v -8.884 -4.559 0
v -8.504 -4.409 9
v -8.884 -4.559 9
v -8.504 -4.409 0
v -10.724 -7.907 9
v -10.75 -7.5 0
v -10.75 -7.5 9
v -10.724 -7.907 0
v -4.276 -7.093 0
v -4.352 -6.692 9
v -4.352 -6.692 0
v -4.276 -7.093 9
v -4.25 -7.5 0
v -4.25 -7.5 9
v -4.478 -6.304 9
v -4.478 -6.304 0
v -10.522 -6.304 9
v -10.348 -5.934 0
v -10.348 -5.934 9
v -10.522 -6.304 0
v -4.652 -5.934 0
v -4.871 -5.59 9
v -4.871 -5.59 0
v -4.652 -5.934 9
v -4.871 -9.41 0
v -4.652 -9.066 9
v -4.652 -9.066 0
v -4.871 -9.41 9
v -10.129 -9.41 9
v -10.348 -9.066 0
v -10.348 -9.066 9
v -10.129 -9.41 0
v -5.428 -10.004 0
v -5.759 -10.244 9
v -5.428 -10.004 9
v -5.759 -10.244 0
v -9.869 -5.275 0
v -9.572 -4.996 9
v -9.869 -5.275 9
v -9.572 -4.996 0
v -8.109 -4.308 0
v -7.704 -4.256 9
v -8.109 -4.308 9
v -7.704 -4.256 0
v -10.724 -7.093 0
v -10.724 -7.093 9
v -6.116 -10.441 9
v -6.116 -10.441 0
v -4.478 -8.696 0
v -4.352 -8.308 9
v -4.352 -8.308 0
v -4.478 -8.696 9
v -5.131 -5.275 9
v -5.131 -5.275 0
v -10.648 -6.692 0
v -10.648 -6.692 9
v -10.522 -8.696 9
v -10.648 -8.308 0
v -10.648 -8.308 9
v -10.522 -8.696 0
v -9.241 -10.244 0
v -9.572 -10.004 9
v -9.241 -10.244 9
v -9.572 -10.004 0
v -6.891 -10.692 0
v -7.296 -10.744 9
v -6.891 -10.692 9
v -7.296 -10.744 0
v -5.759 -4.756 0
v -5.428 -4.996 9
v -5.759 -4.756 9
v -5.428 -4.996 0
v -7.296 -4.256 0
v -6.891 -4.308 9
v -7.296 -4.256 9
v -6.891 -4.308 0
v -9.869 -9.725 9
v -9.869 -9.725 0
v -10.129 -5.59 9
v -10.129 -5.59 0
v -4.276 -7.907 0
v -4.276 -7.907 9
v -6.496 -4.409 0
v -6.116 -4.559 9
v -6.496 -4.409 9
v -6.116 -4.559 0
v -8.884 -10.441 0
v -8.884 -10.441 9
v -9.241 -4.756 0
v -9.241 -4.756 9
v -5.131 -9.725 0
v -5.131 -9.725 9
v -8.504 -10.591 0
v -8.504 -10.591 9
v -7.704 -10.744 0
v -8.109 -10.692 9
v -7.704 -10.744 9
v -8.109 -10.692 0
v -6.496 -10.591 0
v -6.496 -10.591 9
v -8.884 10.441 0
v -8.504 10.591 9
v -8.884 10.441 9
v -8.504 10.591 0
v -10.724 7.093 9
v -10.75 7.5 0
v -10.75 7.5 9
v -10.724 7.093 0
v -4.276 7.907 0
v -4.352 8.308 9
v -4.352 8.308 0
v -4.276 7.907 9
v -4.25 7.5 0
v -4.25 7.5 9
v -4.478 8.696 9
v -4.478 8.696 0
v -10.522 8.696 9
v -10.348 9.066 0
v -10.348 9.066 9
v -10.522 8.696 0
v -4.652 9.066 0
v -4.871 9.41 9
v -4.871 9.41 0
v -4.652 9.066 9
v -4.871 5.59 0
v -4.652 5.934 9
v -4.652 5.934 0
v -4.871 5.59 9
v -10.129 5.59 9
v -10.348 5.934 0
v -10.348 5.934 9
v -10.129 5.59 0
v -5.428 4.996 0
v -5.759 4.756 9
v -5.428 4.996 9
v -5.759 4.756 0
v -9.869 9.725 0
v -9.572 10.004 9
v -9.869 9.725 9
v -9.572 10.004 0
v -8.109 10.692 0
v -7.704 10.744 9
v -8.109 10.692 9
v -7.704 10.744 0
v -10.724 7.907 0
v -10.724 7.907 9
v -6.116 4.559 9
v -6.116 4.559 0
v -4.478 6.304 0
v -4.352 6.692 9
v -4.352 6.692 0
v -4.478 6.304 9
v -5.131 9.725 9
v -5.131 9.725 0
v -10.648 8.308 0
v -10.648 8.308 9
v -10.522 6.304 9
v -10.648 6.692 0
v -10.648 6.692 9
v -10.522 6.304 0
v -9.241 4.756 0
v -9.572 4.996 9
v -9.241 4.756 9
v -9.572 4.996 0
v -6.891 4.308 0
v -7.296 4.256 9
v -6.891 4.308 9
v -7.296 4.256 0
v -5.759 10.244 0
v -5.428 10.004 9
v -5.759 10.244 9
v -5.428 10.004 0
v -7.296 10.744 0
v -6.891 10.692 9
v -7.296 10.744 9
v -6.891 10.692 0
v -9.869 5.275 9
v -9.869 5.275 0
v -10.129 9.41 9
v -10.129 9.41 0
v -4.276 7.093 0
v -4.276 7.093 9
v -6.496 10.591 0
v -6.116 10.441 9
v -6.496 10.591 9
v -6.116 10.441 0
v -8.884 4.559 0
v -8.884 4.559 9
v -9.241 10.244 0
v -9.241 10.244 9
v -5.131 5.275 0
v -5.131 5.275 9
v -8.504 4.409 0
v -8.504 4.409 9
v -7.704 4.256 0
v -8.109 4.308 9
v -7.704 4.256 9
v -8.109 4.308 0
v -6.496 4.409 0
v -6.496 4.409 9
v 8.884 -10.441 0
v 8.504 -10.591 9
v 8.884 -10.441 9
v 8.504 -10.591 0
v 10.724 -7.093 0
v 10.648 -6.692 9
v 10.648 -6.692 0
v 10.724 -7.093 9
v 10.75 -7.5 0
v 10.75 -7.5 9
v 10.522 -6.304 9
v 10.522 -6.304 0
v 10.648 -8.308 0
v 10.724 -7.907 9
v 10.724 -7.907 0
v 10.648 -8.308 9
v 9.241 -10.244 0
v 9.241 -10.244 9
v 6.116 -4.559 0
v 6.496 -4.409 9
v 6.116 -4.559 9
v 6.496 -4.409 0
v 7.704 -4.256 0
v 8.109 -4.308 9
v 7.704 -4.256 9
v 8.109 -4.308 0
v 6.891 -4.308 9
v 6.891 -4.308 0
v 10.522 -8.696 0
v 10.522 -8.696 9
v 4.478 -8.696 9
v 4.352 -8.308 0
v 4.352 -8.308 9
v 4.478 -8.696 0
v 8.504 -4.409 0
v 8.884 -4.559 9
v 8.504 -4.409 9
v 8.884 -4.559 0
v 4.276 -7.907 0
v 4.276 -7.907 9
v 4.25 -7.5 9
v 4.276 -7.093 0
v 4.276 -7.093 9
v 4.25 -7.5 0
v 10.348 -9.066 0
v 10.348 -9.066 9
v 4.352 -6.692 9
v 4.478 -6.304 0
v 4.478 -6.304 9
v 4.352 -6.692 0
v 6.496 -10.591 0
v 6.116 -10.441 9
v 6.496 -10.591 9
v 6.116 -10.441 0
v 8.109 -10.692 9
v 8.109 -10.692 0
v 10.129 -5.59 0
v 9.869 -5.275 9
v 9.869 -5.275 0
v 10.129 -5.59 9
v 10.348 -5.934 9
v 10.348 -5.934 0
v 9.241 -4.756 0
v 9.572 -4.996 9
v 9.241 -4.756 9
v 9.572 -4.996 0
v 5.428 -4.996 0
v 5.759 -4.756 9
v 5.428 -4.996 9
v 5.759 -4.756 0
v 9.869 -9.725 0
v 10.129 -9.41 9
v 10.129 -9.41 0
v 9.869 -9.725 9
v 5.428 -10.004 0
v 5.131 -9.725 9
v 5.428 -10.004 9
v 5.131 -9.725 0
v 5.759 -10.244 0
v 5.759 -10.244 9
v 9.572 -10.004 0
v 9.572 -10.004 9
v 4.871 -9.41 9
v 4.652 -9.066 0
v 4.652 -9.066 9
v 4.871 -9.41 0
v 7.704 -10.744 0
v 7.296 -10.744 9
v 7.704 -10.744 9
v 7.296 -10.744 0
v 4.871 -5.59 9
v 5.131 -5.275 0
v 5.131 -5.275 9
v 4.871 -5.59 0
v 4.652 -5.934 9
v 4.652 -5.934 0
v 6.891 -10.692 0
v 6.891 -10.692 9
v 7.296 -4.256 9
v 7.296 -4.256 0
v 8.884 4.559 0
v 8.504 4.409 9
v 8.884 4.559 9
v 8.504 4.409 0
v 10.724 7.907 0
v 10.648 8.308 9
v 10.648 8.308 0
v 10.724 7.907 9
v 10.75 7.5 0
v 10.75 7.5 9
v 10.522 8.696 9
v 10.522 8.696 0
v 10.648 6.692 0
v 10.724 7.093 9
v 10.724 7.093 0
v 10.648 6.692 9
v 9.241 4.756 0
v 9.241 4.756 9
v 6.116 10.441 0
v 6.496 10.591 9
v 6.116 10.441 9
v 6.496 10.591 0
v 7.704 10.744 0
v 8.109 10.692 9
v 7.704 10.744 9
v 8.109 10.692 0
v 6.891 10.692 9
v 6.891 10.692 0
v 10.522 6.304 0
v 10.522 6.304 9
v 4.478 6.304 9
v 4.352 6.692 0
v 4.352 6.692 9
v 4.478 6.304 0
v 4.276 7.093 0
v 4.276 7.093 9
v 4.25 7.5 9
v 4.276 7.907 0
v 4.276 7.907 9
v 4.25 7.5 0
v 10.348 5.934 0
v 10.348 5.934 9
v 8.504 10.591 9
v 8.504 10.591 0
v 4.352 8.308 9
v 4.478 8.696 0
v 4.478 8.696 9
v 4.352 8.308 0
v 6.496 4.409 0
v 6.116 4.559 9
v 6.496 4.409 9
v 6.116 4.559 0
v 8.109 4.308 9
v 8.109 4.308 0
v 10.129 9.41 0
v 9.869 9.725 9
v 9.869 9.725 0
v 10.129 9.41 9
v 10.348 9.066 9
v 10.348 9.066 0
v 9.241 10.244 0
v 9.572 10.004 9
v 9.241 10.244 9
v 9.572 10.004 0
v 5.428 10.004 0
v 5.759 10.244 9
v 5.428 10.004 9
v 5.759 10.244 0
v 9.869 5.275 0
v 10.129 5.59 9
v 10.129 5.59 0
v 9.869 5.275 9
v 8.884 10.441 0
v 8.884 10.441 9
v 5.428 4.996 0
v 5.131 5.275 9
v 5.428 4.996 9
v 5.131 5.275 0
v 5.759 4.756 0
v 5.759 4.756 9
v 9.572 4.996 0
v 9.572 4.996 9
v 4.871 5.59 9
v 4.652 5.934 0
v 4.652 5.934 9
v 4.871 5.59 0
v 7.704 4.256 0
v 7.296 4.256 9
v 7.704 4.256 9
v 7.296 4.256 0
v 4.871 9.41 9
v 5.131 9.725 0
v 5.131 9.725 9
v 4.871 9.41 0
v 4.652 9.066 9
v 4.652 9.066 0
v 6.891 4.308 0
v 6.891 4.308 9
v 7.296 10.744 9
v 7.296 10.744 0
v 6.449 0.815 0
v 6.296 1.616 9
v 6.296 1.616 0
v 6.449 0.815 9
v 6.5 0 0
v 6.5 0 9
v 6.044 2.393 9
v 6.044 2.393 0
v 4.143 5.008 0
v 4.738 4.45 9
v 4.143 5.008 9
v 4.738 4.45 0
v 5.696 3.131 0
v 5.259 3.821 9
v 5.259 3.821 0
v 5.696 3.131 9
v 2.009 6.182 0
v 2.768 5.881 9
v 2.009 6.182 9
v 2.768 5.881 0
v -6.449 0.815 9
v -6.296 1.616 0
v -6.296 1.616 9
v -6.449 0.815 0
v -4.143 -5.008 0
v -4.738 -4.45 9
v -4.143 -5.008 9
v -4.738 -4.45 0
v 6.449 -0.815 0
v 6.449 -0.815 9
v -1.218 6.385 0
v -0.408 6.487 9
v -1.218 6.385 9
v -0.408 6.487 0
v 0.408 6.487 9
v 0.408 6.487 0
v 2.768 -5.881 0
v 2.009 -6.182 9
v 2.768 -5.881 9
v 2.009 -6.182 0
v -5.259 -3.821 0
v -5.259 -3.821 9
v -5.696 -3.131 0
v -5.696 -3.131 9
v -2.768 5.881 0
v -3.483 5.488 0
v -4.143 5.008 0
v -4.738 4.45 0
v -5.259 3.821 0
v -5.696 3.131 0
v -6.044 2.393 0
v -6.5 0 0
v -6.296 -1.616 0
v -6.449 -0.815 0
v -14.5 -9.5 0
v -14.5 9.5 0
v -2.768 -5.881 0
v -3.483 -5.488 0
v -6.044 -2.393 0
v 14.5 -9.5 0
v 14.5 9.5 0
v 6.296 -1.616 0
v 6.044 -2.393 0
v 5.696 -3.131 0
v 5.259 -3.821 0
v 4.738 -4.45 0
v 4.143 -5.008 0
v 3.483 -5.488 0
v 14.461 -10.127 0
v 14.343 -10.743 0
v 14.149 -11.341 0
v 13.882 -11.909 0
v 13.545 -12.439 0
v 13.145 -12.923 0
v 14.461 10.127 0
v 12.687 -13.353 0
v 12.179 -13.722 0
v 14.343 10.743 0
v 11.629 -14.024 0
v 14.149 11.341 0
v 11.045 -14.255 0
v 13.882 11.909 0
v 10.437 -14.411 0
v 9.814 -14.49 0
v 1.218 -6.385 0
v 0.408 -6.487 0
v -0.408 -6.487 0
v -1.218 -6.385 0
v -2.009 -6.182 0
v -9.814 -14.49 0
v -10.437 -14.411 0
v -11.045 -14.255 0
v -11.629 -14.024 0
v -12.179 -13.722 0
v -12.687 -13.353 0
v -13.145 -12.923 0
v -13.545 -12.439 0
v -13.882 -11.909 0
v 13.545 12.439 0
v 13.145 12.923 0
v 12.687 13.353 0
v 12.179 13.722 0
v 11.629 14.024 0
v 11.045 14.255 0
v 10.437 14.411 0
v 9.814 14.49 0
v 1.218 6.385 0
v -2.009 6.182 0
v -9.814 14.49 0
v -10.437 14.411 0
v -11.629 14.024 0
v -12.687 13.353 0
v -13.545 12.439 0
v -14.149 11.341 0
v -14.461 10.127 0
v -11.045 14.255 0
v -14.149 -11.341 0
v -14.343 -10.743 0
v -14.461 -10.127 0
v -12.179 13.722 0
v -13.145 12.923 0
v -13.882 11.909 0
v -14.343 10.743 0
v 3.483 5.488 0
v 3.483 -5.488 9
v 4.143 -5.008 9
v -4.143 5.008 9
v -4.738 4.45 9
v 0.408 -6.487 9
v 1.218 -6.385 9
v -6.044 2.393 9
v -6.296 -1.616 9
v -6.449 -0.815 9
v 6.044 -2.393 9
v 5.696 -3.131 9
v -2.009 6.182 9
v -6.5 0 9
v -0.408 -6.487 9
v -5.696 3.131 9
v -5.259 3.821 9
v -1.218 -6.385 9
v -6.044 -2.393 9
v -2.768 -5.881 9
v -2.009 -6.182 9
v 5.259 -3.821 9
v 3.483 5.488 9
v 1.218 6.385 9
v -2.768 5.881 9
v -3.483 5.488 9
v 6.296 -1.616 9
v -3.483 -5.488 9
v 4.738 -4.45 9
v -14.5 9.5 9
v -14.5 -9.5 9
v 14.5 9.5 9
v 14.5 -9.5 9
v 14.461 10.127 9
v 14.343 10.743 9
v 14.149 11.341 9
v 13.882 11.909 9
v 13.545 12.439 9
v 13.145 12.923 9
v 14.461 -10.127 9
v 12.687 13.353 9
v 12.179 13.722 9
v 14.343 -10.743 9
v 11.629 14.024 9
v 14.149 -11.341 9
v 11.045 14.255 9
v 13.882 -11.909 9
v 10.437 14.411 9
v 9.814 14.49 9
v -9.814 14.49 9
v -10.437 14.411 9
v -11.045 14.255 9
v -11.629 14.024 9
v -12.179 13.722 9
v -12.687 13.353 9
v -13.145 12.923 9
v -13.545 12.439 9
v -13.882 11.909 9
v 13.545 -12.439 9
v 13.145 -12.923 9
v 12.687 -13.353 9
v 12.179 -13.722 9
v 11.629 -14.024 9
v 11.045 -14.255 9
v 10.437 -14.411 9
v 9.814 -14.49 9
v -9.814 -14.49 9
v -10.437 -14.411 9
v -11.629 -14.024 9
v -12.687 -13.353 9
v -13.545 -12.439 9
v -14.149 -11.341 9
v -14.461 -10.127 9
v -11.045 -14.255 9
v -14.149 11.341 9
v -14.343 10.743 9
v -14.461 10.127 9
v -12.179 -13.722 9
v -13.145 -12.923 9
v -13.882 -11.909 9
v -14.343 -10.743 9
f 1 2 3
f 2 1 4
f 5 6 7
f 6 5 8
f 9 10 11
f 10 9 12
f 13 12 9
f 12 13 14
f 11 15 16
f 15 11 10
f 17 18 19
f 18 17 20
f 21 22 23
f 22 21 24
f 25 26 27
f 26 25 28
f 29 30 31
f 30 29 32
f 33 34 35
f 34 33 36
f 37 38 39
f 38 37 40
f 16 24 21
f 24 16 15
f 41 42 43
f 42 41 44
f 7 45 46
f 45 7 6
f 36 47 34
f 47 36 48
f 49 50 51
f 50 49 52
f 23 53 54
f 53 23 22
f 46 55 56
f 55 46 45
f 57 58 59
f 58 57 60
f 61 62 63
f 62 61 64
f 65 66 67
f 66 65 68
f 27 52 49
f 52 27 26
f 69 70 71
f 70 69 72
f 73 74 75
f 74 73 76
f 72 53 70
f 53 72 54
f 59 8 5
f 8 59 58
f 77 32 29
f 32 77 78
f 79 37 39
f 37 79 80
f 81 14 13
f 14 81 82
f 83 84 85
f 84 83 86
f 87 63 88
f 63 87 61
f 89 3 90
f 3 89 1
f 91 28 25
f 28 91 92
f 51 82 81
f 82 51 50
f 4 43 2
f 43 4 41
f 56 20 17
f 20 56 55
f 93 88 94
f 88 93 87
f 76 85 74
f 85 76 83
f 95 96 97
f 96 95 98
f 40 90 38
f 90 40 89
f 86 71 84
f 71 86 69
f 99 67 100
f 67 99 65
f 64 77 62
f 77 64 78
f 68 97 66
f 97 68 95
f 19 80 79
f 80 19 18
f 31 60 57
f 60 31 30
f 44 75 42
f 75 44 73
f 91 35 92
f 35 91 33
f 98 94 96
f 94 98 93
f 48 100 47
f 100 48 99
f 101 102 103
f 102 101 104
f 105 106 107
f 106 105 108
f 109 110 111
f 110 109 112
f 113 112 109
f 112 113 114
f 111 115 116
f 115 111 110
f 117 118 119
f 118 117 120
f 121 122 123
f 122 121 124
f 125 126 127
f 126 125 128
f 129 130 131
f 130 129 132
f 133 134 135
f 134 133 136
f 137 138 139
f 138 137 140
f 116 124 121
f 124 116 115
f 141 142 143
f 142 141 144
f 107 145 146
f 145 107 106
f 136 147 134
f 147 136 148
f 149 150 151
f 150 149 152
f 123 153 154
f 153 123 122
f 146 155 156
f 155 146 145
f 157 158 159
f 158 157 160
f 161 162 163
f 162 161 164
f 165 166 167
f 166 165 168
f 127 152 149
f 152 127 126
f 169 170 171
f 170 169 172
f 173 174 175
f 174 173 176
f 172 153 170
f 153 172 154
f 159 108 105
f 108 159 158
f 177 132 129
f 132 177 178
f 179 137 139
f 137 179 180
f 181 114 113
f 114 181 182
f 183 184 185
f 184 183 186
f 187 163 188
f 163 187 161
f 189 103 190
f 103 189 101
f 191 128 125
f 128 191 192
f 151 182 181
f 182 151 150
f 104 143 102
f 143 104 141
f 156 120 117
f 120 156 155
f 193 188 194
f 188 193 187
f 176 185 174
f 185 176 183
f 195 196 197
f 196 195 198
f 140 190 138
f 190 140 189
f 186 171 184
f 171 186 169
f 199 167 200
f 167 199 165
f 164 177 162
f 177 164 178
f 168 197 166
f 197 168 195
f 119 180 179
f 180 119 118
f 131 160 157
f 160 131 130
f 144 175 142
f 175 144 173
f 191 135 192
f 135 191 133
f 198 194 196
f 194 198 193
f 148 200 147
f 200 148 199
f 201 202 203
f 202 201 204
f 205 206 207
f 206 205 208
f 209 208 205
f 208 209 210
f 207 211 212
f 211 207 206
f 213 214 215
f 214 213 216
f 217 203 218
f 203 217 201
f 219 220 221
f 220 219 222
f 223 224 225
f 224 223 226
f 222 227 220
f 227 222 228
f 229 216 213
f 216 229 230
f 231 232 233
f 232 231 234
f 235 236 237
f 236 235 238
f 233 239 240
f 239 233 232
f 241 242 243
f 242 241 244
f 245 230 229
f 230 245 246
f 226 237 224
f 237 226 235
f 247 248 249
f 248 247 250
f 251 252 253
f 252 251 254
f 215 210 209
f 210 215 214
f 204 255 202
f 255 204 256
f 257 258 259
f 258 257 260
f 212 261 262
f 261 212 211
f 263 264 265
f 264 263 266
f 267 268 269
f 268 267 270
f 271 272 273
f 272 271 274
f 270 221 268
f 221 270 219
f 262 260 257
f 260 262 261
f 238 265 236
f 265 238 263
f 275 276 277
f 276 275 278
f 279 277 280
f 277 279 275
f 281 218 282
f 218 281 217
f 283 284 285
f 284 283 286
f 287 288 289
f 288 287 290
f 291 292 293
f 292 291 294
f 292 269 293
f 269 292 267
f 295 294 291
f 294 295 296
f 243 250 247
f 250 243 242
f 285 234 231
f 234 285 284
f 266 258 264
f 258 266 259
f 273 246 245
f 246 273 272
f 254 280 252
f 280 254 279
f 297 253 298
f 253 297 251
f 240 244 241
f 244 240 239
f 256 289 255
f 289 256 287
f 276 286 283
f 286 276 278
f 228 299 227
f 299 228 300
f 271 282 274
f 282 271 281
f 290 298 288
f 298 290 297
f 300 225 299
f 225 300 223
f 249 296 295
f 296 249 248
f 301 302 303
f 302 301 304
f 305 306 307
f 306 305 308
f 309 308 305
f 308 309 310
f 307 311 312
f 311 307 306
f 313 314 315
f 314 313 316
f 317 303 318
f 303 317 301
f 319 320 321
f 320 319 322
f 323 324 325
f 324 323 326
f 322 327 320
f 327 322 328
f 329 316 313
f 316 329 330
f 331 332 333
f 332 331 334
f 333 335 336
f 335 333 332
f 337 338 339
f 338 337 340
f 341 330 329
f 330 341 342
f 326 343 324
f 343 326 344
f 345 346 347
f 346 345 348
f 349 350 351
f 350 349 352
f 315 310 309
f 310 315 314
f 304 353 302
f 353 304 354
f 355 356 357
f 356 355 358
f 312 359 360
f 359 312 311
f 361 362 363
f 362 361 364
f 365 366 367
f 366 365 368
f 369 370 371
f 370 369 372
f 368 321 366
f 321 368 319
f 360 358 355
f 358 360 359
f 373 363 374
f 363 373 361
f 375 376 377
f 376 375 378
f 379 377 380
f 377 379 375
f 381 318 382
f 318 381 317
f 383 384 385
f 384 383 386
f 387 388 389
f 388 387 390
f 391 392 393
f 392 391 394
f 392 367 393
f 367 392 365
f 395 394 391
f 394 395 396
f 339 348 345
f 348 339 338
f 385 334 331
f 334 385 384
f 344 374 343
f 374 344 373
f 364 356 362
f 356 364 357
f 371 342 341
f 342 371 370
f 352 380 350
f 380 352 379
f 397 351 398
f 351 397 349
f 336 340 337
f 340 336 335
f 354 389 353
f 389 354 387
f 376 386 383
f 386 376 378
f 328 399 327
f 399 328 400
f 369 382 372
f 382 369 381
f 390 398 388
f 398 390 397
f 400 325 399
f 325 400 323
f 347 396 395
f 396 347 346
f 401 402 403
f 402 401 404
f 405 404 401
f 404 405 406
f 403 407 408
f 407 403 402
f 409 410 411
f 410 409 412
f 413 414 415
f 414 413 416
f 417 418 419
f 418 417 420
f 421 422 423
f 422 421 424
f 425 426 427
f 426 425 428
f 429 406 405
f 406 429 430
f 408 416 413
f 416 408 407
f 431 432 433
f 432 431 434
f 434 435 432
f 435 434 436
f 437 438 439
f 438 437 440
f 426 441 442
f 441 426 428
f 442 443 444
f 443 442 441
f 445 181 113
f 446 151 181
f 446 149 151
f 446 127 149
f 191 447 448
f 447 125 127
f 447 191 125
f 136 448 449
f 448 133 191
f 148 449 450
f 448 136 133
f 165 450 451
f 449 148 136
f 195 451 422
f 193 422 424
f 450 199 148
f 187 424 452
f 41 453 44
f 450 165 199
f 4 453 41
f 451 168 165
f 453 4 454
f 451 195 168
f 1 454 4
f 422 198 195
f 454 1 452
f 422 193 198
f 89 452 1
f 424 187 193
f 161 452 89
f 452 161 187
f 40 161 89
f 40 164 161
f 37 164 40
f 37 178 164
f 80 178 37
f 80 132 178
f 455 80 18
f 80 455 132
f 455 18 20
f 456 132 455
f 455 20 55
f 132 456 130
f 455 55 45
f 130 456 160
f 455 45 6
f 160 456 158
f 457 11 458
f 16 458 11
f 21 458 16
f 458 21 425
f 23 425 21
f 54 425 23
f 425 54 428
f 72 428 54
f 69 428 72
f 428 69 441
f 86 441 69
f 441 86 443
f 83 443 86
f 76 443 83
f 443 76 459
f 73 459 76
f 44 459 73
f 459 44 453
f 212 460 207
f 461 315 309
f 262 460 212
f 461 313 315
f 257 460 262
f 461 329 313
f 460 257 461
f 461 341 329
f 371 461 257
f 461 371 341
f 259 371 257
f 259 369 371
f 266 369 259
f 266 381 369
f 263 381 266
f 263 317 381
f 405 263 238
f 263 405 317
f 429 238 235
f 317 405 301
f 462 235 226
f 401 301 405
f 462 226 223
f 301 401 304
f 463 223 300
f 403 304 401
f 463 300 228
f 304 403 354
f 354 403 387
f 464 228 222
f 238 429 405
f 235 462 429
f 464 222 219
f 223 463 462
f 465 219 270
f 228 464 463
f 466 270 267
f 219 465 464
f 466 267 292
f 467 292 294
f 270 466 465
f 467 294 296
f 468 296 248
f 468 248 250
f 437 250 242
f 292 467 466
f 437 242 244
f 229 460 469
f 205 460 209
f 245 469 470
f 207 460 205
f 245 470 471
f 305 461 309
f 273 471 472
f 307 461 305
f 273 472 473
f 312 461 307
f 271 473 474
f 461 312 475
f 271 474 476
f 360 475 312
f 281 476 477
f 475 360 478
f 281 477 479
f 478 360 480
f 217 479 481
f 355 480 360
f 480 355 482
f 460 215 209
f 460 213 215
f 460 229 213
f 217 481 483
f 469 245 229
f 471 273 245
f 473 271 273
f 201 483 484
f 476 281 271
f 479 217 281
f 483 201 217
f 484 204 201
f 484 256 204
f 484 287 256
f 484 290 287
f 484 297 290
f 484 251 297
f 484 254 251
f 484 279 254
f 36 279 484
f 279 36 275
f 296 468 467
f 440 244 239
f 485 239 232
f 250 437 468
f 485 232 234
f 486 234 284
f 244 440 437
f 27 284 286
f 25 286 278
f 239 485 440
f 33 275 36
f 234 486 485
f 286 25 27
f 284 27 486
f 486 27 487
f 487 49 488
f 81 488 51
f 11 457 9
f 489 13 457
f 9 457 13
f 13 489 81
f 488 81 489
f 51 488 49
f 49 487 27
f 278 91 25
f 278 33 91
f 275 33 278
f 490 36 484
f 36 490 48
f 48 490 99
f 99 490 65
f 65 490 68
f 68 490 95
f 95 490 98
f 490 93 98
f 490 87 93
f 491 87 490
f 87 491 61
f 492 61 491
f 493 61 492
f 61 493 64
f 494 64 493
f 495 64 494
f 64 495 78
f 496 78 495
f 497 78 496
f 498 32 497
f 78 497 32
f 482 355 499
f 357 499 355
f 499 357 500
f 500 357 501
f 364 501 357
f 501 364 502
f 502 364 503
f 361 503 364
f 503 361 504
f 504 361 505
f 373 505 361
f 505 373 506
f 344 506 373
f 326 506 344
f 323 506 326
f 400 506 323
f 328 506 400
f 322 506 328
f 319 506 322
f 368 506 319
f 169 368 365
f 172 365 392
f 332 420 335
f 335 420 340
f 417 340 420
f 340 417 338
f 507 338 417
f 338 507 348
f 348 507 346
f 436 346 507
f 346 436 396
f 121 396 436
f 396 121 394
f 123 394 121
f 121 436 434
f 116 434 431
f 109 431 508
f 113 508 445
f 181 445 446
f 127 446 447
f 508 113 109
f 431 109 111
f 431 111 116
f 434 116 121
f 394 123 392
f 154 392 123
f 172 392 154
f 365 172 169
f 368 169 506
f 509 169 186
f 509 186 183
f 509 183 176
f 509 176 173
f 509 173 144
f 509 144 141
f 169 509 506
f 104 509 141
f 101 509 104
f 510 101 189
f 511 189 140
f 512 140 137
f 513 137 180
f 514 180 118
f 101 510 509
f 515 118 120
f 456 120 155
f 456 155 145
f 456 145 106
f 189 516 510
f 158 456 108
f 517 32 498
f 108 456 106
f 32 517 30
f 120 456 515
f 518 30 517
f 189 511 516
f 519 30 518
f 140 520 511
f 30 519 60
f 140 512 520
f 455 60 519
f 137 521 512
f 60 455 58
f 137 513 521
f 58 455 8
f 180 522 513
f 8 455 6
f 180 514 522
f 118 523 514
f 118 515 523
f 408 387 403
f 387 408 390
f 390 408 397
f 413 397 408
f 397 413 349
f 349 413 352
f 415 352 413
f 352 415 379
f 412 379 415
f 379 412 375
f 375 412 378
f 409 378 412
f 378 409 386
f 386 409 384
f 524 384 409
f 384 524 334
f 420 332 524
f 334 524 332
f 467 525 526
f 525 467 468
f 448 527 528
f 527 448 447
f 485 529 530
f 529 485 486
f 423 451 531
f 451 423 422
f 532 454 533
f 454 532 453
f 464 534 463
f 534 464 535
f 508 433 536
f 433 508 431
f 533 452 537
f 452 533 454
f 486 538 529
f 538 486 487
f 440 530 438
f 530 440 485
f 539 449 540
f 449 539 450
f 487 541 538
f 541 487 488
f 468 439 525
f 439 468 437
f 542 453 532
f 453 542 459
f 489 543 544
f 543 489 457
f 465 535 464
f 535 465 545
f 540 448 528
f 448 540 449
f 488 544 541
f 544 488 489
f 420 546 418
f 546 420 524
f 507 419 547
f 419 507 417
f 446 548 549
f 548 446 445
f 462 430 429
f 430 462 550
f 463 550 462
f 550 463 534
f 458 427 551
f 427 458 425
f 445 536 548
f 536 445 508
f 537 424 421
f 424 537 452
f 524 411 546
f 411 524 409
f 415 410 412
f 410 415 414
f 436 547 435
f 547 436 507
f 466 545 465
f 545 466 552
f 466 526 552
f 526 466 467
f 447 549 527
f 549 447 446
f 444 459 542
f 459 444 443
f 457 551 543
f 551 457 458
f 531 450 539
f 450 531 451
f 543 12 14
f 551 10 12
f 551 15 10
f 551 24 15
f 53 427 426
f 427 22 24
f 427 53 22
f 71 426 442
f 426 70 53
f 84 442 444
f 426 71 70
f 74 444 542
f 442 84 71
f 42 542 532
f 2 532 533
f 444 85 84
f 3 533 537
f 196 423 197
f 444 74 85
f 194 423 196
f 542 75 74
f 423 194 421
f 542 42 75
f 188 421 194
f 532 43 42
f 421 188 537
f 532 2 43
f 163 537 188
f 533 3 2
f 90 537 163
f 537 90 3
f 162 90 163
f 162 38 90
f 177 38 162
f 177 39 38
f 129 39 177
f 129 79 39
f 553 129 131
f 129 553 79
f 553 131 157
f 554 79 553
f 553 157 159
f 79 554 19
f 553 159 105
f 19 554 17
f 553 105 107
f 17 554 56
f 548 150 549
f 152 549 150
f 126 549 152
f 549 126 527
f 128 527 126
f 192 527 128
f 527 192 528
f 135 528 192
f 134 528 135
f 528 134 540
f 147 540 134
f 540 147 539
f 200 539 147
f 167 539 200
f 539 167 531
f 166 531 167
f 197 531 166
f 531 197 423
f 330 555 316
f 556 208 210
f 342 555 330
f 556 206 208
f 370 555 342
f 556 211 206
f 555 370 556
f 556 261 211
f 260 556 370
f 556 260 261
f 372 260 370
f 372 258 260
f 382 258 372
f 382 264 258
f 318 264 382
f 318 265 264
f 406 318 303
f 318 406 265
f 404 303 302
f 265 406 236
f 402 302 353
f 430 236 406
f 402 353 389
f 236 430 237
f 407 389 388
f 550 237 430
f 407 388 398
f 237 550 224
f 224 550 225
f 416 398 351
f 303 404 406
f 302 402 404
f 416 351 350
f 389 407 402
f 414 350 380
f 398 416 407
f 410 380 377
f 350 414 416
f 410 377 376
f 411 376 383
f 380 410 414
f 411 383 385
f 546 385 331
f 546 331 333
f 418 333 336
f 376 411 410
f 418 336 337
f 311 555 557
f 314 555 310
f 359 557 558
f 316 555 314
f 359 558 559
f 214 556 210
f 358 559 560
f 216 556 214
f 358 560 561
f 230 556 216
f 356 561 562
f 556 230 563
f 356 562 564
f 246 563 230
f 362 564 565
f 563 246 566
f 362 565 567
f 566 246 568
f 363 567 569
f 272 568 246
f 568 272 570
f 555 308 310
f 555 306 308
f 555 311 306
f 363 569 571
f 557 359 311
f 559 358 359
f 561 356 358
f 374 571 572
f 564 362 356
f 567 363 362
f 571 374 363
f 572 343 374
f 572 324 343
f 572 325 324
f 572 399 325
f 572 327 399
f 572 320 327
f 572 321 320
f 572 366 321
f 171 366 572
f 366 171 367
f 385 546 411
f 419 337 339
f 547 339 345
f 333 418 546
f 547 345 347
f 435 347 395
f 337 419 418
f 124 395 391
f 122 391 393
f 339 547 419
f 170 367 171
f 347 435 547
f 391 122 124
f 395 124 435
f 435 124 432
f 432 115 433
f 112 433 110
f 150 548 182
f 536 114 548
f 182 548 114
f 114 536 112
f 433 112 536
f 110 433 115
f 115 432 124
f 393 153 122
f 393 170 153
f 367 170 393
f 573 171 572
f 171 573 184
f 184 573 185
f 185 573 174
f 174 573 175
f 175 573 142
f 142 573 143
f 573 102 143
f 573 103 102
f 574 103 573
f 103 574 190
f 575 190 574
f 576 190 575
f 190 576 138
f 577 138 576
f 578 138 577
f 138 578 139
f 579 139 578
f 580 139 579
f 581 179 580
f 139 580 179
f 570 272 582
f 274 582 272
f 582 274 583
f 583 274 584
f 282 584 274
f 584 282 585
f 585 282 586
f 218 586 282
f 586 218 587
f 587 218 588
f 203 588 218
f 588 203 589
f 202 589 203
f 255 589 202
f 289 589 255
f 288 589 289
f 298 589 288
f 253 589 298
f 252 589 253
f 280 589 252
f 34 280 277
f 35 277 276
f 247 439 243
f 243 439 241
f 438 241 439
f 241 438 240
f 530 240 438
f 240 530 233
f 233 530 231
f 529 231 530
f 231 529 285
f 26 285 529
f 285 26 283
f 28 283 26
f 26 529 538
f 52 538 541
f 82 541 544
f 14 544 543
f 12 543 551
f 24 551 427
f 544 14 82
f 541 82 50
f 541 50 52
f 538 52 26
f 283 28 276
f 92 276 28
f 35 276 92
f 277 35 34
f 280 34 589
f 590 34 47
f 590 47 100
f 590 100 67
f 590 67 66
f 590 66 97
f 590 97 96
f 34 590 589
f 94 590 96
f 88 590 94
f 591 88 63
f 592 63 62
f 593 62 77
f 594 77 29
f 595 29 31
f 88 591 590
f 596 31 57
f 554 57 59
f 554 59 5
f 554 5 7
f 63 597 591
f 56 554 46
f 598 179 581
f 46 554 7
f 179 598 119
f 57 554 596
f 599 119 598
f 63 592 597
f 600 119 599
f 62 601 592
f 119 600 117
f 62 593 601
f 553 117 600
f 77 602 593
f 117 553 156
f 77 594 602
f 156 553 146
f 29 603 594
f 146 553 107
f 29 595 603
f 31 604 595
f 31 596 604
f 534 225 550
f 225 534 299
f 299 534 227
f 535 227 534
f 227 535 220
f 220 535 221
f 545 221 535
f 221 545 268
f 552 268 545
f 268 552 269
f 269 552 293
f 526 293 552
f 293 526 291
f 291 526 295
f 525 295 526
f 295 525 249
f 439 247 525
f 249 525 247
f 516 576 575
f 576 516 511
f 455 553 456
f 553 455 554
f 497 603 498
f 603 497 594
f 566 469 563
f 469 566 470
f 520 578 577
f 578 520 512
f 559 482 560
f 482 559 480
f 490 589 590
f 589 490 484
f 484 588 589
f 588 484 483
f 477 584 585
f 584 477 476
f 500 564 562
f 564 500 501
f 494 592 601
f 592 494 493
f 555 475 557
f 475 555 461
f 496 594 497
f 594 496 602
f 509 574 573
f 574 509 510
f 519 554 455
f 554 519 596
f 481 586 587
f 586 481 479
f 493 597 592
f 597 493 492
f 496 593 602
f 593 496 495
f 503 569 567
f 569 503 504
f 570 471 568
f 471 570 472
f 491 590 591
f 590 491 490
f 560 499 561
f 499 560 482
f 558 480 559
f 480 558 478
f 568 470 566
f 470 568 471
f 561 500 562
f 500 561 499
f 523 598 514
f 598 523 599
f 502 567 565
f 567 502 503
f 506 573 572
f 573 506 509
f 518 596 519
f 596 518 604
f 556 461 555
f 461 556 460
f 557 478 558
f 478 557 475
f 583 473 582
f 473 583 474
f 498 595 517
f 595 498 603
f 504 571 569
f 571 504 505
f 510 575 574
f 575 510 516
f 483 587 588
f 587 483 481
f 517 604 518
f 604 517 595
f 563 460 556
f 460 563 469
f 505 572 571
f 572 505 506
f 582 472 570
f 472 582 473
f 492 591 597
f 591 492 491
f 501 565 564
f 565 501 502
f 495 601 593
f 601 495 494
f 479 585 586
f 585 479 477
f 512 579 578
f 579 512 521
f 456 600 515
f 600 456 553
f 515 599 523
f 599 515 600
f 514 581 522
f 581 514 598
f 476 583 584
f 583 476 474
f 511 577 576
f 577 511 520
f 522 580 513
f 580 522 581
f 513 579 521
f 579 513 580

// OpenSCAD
$fn = 50;

difference() {
	union() {
		hull() {
			translate(v = [-9.5, 9.5, 0]) {
				cylinder(h = 9, r = 5);
			}
			translate(v = [9.5, 9.5, 0]) {
				cylinder(h = 9, r = 5);
			}
			translate(v = [-9.5, -9.5, 0]) {
				cylinder(h = 9, r = 5);
			}
			translate(v = [9.5, -9.5, 0]) {
				cylinder(h = 9, r = 5);
			}
		}
	}
	union() {
		translate(v = [-7.5, -7.5, -100.0]) {
			cylinder(h = 200, r = 3.25);
		}
		translate(v = [-7.5, 7.5, -100.0]) {
			cylinder(h = 200, r = 3.25);
		}
		translate(v = [7.5, -7.5, -100.0]) {
			cylinder(h = 200, r = 3.25);
		}
		translate(v = [7.5, 7.5, -100.0]) {
			cylinder(h = 200, r = 3.25);
		}
		translate(v = [-7.5, -7.5, -100.0]) {
			cylinder(h = 200, r = 1.8);
		}
		translate(v = [-7.5, 7.5, -100.0]) {
			cylinder(h = 200, r = 1.8);
		}
		translate(v = [7.5, -7.5, -100.0]) {
			cylinder(h = 200, r = 1.8);
		}
		translate(v = [7.5, 7.5, -100.0]) {
			cylinder(h = 200, r = 1.8);
		}
		cylinder(h = 9, r = 6.5);
	}
}
